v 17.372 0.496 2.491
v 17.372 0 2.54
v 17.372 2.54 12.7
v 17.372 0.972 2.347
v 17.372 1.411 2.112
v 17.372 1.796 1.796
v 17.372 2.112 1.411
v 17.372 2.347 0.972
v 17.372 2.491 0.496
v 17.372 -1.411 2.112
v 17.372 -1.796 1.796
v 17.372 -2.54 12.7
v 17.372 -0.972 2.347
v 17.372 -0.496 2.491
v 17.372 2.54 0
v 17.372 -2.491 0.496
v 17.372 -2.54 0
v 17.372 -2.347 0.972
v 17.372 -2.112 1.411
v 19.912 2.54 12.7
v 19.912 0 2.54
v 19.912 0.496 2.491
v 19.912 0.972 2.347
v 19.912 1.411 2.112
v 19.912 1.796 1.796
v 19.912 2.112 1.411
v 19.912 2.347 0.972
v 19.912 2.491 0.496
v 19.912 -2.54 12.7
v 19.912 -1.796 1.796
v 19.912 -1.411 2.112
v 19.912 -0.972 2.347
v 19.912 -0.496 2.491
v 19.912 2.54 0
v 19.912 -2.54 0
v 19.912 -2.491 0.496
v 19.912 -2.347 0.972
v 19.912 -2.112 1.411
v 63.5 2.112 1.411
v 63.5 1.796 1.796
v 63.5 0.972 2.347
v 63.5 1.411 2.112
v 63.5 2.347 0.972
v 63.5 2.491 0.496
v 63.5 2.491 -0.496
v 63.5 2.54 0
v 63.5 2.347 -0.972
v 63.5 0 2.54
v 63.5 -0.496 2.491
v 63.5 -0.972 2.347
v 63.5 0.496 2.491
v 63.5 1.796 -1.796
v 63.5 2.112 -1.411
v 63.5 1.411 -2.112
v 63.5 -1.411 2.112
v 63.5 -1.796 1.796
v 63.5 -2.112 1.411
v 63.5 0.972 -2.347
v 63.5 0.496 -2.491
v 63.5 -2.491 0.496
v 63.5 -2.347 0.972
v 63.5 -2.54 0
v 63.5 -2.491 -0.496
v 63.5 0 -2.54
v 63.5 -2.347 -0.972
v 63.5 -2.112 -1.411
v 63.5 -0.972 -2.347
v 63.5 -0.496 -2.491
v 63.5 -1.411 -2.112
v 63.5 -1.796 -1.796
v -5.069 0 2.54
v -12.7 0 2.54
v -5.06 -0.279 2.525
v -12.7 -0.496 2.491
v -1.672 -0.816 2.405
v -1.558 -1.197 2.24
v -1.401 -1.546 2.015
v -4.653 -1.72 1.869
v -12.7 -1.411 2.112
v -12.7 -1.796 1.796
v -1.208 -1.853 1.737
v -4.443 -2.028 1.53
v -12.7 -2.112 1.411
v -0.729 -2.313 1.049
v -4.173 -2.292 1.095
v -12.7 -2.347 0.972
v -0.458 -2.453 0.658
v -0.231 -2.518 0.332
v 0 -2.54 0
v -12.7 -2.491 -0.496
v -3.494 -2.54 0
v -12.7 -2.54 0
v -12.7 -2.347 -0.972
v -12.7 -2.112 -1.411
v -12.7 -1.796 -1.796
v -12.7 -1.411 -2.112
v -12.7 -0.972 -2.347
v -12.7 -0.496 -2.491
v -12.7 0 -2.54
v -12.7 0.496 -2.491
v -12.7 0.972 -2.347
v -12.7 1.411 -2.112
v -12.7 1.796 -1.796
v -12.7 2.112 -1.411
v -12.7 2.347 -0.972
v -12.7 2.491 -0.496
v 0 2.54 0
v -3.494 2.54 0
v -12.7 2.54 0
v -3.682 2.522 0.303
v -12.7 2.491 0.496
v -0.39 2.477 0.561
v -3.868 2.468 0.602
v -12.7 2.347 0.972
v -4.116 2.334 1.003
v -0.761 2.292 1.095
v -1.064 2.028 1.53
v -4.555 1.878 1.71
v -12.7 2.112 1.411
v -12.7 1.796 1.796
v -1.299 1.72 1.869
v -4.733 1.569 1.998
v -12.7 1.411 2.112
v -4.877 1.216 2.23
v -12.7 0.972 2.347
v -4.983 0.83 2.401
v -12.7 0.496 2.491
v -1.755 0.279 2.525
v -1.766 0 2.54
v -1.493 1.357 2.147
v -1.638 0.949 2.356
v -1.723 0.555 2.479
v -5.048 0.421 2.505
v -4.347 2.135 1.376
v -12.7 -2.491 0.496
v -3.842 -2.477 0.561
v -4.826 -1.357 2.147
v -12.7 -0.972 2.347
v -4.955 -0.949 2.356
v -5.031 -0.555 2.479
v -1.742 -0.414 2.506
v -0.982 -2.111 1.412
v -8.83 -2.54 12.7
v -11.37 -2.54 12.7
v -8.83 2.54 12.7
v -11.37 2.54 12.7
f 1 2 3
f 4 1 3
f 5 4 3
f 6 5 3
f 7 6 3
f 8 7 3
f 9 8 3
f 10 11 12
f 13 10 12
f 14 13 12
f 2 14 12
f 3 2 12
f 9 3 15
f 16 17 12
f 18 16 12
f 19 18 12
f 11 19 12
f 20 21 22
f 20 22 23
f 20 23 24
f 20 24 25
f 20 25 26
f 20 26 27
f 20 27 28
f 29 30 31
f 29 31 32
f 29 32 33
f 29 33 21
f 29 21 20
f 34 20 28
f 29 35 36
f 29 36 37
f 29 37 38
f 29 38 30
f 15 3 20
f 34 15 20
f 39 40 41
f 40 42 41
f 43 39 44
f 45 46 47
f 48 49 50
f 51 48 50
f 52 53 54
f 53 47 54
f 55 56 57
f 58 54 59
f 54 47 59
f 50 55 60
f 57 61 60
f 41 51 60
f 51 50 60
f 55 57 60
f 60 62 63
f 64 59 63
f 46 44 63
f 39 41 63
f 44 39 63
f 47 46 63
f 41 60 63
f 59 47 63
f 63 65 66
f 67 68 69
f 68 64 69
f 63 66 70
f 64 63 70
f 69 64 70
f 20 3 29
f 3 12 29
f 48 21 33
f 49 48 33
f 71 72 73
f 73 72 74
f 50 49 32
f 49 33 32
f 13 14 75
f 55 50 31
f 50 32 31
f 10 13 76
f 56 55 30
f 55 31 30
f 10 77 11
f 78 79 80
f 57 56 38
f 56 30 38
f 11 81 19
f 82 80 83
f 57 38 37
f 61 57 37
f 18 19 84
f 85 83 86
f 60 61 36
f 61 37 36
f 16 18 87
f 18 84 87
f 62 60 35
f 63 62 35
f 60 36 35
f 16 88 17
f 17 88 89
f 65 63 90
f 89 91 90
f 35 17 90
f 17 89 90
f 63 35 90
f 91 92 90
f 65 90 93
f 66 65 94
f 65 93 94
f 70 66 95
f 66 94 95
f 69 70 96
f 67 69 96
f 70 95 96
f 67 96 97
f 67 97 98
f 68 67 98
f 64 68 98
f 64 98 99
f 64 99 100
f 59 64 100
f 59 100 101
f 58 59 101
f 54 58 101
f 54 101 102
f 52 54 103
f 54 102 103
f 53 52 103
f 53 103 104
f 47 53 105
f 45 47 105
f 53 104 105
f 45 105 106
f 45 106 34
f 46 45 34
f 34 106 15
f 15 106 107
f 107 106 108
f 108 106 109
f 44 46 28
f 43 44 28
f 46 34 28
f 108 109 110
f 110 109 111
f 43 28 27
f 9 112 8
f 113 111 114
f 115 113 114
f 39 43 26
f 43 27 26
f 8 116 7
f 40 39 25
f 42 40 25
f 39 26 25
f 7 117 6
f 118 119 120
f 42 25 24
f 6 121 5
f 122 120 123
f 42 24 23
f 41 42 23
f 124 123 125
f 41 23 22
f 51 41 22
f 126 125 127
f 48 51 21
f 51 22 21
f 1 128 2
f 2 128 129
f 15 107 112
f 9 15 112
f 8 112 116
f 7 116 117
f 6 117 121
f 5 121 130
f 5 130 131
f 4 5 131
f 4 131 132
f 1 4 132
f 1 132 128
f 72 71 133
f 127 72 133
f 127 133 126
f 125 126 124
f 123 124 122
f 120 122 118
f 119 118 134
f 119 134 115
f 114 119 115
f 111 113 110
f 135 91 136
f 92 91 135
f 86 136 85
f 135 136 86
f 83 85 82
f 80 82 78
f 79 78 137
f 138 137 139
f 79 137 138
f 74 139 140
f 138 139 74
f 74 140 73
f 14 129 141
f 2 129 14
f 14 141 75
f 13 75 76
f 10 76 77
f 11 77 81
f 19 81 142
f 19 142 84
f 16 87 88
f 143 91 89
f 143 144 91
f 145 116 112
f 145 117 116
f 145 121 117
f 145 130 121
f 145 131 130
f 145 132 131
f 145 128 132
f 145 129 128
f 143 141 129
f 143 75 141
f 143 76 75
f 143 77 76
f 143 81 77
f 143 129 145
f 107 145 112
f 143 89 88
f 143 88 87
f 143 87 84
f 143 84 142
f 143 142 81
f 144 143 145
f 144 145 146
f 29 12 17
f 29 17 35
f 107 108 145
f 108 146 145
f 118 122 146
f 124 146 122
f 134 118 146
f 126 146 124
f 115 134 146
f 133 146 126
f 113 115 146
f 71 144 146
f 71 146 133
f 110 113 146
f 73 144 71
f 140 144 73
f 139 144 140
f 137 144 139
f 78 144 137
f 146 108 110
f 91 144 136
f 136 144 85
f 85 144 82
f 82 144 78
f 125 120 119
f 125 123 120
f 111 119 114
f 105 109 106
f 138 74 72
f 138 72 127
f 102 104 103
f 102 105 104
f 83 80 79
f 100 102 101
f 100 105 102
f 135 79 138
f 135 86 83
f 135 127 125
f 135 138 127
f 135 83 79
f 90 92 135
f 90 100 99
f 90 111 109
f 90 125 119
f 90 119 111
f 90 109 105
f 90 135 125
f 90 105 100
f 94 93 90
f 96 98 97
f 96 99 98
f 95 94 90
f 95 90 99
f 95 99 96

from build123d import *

# Parameters (mm, degrees)
F2_DEPTH = 2.54
F1_W     = 2.54
F1_H     = 12.7
F0_W     = 63.5
F0_H     = 2.54
F0_W_2   = 12.7


with BuildPart() as f2:
    # F1 (on Front) → F2 (new body, symmetric)
    with BuildSketch(Plane.XZ):
        Polygon((-3.4942510538, 0), (0, 0), (-8.8303433731, 12.7), (-11.3703433731, 12.7), align=None)
    extrude(amount=F2_DEPTH, both=True)



with BuildPart() as f2b:
    # F1 (on Front) → F2, piece 2 (new body, symmetric)
    with BuildSketch(Plane.XZ):
        with Locations((18.6417625439, 6.35)):
            Rectangle(F1_W, F1_H)
    extrude(amount=F2_DEPTH, both=True)


with BuildPart() as f2_1:
    add(f2.part)

    add(f2b.part)  # F3 merges F2b
    # F0 (on Front) → F3 (revolve)
    with BuildSketch(Plane.XZ):
        with Locations((31.75, 1.27)):
            Rectangle(F0_W, F0_H)
        with Locations((-6.35, 1.27)):
            Rectangle(F0_W_2, F0_H)
    revolve(axis=Axis((31.75, 0, 0), (1, 0, 0)))


solid = f2_1.part
